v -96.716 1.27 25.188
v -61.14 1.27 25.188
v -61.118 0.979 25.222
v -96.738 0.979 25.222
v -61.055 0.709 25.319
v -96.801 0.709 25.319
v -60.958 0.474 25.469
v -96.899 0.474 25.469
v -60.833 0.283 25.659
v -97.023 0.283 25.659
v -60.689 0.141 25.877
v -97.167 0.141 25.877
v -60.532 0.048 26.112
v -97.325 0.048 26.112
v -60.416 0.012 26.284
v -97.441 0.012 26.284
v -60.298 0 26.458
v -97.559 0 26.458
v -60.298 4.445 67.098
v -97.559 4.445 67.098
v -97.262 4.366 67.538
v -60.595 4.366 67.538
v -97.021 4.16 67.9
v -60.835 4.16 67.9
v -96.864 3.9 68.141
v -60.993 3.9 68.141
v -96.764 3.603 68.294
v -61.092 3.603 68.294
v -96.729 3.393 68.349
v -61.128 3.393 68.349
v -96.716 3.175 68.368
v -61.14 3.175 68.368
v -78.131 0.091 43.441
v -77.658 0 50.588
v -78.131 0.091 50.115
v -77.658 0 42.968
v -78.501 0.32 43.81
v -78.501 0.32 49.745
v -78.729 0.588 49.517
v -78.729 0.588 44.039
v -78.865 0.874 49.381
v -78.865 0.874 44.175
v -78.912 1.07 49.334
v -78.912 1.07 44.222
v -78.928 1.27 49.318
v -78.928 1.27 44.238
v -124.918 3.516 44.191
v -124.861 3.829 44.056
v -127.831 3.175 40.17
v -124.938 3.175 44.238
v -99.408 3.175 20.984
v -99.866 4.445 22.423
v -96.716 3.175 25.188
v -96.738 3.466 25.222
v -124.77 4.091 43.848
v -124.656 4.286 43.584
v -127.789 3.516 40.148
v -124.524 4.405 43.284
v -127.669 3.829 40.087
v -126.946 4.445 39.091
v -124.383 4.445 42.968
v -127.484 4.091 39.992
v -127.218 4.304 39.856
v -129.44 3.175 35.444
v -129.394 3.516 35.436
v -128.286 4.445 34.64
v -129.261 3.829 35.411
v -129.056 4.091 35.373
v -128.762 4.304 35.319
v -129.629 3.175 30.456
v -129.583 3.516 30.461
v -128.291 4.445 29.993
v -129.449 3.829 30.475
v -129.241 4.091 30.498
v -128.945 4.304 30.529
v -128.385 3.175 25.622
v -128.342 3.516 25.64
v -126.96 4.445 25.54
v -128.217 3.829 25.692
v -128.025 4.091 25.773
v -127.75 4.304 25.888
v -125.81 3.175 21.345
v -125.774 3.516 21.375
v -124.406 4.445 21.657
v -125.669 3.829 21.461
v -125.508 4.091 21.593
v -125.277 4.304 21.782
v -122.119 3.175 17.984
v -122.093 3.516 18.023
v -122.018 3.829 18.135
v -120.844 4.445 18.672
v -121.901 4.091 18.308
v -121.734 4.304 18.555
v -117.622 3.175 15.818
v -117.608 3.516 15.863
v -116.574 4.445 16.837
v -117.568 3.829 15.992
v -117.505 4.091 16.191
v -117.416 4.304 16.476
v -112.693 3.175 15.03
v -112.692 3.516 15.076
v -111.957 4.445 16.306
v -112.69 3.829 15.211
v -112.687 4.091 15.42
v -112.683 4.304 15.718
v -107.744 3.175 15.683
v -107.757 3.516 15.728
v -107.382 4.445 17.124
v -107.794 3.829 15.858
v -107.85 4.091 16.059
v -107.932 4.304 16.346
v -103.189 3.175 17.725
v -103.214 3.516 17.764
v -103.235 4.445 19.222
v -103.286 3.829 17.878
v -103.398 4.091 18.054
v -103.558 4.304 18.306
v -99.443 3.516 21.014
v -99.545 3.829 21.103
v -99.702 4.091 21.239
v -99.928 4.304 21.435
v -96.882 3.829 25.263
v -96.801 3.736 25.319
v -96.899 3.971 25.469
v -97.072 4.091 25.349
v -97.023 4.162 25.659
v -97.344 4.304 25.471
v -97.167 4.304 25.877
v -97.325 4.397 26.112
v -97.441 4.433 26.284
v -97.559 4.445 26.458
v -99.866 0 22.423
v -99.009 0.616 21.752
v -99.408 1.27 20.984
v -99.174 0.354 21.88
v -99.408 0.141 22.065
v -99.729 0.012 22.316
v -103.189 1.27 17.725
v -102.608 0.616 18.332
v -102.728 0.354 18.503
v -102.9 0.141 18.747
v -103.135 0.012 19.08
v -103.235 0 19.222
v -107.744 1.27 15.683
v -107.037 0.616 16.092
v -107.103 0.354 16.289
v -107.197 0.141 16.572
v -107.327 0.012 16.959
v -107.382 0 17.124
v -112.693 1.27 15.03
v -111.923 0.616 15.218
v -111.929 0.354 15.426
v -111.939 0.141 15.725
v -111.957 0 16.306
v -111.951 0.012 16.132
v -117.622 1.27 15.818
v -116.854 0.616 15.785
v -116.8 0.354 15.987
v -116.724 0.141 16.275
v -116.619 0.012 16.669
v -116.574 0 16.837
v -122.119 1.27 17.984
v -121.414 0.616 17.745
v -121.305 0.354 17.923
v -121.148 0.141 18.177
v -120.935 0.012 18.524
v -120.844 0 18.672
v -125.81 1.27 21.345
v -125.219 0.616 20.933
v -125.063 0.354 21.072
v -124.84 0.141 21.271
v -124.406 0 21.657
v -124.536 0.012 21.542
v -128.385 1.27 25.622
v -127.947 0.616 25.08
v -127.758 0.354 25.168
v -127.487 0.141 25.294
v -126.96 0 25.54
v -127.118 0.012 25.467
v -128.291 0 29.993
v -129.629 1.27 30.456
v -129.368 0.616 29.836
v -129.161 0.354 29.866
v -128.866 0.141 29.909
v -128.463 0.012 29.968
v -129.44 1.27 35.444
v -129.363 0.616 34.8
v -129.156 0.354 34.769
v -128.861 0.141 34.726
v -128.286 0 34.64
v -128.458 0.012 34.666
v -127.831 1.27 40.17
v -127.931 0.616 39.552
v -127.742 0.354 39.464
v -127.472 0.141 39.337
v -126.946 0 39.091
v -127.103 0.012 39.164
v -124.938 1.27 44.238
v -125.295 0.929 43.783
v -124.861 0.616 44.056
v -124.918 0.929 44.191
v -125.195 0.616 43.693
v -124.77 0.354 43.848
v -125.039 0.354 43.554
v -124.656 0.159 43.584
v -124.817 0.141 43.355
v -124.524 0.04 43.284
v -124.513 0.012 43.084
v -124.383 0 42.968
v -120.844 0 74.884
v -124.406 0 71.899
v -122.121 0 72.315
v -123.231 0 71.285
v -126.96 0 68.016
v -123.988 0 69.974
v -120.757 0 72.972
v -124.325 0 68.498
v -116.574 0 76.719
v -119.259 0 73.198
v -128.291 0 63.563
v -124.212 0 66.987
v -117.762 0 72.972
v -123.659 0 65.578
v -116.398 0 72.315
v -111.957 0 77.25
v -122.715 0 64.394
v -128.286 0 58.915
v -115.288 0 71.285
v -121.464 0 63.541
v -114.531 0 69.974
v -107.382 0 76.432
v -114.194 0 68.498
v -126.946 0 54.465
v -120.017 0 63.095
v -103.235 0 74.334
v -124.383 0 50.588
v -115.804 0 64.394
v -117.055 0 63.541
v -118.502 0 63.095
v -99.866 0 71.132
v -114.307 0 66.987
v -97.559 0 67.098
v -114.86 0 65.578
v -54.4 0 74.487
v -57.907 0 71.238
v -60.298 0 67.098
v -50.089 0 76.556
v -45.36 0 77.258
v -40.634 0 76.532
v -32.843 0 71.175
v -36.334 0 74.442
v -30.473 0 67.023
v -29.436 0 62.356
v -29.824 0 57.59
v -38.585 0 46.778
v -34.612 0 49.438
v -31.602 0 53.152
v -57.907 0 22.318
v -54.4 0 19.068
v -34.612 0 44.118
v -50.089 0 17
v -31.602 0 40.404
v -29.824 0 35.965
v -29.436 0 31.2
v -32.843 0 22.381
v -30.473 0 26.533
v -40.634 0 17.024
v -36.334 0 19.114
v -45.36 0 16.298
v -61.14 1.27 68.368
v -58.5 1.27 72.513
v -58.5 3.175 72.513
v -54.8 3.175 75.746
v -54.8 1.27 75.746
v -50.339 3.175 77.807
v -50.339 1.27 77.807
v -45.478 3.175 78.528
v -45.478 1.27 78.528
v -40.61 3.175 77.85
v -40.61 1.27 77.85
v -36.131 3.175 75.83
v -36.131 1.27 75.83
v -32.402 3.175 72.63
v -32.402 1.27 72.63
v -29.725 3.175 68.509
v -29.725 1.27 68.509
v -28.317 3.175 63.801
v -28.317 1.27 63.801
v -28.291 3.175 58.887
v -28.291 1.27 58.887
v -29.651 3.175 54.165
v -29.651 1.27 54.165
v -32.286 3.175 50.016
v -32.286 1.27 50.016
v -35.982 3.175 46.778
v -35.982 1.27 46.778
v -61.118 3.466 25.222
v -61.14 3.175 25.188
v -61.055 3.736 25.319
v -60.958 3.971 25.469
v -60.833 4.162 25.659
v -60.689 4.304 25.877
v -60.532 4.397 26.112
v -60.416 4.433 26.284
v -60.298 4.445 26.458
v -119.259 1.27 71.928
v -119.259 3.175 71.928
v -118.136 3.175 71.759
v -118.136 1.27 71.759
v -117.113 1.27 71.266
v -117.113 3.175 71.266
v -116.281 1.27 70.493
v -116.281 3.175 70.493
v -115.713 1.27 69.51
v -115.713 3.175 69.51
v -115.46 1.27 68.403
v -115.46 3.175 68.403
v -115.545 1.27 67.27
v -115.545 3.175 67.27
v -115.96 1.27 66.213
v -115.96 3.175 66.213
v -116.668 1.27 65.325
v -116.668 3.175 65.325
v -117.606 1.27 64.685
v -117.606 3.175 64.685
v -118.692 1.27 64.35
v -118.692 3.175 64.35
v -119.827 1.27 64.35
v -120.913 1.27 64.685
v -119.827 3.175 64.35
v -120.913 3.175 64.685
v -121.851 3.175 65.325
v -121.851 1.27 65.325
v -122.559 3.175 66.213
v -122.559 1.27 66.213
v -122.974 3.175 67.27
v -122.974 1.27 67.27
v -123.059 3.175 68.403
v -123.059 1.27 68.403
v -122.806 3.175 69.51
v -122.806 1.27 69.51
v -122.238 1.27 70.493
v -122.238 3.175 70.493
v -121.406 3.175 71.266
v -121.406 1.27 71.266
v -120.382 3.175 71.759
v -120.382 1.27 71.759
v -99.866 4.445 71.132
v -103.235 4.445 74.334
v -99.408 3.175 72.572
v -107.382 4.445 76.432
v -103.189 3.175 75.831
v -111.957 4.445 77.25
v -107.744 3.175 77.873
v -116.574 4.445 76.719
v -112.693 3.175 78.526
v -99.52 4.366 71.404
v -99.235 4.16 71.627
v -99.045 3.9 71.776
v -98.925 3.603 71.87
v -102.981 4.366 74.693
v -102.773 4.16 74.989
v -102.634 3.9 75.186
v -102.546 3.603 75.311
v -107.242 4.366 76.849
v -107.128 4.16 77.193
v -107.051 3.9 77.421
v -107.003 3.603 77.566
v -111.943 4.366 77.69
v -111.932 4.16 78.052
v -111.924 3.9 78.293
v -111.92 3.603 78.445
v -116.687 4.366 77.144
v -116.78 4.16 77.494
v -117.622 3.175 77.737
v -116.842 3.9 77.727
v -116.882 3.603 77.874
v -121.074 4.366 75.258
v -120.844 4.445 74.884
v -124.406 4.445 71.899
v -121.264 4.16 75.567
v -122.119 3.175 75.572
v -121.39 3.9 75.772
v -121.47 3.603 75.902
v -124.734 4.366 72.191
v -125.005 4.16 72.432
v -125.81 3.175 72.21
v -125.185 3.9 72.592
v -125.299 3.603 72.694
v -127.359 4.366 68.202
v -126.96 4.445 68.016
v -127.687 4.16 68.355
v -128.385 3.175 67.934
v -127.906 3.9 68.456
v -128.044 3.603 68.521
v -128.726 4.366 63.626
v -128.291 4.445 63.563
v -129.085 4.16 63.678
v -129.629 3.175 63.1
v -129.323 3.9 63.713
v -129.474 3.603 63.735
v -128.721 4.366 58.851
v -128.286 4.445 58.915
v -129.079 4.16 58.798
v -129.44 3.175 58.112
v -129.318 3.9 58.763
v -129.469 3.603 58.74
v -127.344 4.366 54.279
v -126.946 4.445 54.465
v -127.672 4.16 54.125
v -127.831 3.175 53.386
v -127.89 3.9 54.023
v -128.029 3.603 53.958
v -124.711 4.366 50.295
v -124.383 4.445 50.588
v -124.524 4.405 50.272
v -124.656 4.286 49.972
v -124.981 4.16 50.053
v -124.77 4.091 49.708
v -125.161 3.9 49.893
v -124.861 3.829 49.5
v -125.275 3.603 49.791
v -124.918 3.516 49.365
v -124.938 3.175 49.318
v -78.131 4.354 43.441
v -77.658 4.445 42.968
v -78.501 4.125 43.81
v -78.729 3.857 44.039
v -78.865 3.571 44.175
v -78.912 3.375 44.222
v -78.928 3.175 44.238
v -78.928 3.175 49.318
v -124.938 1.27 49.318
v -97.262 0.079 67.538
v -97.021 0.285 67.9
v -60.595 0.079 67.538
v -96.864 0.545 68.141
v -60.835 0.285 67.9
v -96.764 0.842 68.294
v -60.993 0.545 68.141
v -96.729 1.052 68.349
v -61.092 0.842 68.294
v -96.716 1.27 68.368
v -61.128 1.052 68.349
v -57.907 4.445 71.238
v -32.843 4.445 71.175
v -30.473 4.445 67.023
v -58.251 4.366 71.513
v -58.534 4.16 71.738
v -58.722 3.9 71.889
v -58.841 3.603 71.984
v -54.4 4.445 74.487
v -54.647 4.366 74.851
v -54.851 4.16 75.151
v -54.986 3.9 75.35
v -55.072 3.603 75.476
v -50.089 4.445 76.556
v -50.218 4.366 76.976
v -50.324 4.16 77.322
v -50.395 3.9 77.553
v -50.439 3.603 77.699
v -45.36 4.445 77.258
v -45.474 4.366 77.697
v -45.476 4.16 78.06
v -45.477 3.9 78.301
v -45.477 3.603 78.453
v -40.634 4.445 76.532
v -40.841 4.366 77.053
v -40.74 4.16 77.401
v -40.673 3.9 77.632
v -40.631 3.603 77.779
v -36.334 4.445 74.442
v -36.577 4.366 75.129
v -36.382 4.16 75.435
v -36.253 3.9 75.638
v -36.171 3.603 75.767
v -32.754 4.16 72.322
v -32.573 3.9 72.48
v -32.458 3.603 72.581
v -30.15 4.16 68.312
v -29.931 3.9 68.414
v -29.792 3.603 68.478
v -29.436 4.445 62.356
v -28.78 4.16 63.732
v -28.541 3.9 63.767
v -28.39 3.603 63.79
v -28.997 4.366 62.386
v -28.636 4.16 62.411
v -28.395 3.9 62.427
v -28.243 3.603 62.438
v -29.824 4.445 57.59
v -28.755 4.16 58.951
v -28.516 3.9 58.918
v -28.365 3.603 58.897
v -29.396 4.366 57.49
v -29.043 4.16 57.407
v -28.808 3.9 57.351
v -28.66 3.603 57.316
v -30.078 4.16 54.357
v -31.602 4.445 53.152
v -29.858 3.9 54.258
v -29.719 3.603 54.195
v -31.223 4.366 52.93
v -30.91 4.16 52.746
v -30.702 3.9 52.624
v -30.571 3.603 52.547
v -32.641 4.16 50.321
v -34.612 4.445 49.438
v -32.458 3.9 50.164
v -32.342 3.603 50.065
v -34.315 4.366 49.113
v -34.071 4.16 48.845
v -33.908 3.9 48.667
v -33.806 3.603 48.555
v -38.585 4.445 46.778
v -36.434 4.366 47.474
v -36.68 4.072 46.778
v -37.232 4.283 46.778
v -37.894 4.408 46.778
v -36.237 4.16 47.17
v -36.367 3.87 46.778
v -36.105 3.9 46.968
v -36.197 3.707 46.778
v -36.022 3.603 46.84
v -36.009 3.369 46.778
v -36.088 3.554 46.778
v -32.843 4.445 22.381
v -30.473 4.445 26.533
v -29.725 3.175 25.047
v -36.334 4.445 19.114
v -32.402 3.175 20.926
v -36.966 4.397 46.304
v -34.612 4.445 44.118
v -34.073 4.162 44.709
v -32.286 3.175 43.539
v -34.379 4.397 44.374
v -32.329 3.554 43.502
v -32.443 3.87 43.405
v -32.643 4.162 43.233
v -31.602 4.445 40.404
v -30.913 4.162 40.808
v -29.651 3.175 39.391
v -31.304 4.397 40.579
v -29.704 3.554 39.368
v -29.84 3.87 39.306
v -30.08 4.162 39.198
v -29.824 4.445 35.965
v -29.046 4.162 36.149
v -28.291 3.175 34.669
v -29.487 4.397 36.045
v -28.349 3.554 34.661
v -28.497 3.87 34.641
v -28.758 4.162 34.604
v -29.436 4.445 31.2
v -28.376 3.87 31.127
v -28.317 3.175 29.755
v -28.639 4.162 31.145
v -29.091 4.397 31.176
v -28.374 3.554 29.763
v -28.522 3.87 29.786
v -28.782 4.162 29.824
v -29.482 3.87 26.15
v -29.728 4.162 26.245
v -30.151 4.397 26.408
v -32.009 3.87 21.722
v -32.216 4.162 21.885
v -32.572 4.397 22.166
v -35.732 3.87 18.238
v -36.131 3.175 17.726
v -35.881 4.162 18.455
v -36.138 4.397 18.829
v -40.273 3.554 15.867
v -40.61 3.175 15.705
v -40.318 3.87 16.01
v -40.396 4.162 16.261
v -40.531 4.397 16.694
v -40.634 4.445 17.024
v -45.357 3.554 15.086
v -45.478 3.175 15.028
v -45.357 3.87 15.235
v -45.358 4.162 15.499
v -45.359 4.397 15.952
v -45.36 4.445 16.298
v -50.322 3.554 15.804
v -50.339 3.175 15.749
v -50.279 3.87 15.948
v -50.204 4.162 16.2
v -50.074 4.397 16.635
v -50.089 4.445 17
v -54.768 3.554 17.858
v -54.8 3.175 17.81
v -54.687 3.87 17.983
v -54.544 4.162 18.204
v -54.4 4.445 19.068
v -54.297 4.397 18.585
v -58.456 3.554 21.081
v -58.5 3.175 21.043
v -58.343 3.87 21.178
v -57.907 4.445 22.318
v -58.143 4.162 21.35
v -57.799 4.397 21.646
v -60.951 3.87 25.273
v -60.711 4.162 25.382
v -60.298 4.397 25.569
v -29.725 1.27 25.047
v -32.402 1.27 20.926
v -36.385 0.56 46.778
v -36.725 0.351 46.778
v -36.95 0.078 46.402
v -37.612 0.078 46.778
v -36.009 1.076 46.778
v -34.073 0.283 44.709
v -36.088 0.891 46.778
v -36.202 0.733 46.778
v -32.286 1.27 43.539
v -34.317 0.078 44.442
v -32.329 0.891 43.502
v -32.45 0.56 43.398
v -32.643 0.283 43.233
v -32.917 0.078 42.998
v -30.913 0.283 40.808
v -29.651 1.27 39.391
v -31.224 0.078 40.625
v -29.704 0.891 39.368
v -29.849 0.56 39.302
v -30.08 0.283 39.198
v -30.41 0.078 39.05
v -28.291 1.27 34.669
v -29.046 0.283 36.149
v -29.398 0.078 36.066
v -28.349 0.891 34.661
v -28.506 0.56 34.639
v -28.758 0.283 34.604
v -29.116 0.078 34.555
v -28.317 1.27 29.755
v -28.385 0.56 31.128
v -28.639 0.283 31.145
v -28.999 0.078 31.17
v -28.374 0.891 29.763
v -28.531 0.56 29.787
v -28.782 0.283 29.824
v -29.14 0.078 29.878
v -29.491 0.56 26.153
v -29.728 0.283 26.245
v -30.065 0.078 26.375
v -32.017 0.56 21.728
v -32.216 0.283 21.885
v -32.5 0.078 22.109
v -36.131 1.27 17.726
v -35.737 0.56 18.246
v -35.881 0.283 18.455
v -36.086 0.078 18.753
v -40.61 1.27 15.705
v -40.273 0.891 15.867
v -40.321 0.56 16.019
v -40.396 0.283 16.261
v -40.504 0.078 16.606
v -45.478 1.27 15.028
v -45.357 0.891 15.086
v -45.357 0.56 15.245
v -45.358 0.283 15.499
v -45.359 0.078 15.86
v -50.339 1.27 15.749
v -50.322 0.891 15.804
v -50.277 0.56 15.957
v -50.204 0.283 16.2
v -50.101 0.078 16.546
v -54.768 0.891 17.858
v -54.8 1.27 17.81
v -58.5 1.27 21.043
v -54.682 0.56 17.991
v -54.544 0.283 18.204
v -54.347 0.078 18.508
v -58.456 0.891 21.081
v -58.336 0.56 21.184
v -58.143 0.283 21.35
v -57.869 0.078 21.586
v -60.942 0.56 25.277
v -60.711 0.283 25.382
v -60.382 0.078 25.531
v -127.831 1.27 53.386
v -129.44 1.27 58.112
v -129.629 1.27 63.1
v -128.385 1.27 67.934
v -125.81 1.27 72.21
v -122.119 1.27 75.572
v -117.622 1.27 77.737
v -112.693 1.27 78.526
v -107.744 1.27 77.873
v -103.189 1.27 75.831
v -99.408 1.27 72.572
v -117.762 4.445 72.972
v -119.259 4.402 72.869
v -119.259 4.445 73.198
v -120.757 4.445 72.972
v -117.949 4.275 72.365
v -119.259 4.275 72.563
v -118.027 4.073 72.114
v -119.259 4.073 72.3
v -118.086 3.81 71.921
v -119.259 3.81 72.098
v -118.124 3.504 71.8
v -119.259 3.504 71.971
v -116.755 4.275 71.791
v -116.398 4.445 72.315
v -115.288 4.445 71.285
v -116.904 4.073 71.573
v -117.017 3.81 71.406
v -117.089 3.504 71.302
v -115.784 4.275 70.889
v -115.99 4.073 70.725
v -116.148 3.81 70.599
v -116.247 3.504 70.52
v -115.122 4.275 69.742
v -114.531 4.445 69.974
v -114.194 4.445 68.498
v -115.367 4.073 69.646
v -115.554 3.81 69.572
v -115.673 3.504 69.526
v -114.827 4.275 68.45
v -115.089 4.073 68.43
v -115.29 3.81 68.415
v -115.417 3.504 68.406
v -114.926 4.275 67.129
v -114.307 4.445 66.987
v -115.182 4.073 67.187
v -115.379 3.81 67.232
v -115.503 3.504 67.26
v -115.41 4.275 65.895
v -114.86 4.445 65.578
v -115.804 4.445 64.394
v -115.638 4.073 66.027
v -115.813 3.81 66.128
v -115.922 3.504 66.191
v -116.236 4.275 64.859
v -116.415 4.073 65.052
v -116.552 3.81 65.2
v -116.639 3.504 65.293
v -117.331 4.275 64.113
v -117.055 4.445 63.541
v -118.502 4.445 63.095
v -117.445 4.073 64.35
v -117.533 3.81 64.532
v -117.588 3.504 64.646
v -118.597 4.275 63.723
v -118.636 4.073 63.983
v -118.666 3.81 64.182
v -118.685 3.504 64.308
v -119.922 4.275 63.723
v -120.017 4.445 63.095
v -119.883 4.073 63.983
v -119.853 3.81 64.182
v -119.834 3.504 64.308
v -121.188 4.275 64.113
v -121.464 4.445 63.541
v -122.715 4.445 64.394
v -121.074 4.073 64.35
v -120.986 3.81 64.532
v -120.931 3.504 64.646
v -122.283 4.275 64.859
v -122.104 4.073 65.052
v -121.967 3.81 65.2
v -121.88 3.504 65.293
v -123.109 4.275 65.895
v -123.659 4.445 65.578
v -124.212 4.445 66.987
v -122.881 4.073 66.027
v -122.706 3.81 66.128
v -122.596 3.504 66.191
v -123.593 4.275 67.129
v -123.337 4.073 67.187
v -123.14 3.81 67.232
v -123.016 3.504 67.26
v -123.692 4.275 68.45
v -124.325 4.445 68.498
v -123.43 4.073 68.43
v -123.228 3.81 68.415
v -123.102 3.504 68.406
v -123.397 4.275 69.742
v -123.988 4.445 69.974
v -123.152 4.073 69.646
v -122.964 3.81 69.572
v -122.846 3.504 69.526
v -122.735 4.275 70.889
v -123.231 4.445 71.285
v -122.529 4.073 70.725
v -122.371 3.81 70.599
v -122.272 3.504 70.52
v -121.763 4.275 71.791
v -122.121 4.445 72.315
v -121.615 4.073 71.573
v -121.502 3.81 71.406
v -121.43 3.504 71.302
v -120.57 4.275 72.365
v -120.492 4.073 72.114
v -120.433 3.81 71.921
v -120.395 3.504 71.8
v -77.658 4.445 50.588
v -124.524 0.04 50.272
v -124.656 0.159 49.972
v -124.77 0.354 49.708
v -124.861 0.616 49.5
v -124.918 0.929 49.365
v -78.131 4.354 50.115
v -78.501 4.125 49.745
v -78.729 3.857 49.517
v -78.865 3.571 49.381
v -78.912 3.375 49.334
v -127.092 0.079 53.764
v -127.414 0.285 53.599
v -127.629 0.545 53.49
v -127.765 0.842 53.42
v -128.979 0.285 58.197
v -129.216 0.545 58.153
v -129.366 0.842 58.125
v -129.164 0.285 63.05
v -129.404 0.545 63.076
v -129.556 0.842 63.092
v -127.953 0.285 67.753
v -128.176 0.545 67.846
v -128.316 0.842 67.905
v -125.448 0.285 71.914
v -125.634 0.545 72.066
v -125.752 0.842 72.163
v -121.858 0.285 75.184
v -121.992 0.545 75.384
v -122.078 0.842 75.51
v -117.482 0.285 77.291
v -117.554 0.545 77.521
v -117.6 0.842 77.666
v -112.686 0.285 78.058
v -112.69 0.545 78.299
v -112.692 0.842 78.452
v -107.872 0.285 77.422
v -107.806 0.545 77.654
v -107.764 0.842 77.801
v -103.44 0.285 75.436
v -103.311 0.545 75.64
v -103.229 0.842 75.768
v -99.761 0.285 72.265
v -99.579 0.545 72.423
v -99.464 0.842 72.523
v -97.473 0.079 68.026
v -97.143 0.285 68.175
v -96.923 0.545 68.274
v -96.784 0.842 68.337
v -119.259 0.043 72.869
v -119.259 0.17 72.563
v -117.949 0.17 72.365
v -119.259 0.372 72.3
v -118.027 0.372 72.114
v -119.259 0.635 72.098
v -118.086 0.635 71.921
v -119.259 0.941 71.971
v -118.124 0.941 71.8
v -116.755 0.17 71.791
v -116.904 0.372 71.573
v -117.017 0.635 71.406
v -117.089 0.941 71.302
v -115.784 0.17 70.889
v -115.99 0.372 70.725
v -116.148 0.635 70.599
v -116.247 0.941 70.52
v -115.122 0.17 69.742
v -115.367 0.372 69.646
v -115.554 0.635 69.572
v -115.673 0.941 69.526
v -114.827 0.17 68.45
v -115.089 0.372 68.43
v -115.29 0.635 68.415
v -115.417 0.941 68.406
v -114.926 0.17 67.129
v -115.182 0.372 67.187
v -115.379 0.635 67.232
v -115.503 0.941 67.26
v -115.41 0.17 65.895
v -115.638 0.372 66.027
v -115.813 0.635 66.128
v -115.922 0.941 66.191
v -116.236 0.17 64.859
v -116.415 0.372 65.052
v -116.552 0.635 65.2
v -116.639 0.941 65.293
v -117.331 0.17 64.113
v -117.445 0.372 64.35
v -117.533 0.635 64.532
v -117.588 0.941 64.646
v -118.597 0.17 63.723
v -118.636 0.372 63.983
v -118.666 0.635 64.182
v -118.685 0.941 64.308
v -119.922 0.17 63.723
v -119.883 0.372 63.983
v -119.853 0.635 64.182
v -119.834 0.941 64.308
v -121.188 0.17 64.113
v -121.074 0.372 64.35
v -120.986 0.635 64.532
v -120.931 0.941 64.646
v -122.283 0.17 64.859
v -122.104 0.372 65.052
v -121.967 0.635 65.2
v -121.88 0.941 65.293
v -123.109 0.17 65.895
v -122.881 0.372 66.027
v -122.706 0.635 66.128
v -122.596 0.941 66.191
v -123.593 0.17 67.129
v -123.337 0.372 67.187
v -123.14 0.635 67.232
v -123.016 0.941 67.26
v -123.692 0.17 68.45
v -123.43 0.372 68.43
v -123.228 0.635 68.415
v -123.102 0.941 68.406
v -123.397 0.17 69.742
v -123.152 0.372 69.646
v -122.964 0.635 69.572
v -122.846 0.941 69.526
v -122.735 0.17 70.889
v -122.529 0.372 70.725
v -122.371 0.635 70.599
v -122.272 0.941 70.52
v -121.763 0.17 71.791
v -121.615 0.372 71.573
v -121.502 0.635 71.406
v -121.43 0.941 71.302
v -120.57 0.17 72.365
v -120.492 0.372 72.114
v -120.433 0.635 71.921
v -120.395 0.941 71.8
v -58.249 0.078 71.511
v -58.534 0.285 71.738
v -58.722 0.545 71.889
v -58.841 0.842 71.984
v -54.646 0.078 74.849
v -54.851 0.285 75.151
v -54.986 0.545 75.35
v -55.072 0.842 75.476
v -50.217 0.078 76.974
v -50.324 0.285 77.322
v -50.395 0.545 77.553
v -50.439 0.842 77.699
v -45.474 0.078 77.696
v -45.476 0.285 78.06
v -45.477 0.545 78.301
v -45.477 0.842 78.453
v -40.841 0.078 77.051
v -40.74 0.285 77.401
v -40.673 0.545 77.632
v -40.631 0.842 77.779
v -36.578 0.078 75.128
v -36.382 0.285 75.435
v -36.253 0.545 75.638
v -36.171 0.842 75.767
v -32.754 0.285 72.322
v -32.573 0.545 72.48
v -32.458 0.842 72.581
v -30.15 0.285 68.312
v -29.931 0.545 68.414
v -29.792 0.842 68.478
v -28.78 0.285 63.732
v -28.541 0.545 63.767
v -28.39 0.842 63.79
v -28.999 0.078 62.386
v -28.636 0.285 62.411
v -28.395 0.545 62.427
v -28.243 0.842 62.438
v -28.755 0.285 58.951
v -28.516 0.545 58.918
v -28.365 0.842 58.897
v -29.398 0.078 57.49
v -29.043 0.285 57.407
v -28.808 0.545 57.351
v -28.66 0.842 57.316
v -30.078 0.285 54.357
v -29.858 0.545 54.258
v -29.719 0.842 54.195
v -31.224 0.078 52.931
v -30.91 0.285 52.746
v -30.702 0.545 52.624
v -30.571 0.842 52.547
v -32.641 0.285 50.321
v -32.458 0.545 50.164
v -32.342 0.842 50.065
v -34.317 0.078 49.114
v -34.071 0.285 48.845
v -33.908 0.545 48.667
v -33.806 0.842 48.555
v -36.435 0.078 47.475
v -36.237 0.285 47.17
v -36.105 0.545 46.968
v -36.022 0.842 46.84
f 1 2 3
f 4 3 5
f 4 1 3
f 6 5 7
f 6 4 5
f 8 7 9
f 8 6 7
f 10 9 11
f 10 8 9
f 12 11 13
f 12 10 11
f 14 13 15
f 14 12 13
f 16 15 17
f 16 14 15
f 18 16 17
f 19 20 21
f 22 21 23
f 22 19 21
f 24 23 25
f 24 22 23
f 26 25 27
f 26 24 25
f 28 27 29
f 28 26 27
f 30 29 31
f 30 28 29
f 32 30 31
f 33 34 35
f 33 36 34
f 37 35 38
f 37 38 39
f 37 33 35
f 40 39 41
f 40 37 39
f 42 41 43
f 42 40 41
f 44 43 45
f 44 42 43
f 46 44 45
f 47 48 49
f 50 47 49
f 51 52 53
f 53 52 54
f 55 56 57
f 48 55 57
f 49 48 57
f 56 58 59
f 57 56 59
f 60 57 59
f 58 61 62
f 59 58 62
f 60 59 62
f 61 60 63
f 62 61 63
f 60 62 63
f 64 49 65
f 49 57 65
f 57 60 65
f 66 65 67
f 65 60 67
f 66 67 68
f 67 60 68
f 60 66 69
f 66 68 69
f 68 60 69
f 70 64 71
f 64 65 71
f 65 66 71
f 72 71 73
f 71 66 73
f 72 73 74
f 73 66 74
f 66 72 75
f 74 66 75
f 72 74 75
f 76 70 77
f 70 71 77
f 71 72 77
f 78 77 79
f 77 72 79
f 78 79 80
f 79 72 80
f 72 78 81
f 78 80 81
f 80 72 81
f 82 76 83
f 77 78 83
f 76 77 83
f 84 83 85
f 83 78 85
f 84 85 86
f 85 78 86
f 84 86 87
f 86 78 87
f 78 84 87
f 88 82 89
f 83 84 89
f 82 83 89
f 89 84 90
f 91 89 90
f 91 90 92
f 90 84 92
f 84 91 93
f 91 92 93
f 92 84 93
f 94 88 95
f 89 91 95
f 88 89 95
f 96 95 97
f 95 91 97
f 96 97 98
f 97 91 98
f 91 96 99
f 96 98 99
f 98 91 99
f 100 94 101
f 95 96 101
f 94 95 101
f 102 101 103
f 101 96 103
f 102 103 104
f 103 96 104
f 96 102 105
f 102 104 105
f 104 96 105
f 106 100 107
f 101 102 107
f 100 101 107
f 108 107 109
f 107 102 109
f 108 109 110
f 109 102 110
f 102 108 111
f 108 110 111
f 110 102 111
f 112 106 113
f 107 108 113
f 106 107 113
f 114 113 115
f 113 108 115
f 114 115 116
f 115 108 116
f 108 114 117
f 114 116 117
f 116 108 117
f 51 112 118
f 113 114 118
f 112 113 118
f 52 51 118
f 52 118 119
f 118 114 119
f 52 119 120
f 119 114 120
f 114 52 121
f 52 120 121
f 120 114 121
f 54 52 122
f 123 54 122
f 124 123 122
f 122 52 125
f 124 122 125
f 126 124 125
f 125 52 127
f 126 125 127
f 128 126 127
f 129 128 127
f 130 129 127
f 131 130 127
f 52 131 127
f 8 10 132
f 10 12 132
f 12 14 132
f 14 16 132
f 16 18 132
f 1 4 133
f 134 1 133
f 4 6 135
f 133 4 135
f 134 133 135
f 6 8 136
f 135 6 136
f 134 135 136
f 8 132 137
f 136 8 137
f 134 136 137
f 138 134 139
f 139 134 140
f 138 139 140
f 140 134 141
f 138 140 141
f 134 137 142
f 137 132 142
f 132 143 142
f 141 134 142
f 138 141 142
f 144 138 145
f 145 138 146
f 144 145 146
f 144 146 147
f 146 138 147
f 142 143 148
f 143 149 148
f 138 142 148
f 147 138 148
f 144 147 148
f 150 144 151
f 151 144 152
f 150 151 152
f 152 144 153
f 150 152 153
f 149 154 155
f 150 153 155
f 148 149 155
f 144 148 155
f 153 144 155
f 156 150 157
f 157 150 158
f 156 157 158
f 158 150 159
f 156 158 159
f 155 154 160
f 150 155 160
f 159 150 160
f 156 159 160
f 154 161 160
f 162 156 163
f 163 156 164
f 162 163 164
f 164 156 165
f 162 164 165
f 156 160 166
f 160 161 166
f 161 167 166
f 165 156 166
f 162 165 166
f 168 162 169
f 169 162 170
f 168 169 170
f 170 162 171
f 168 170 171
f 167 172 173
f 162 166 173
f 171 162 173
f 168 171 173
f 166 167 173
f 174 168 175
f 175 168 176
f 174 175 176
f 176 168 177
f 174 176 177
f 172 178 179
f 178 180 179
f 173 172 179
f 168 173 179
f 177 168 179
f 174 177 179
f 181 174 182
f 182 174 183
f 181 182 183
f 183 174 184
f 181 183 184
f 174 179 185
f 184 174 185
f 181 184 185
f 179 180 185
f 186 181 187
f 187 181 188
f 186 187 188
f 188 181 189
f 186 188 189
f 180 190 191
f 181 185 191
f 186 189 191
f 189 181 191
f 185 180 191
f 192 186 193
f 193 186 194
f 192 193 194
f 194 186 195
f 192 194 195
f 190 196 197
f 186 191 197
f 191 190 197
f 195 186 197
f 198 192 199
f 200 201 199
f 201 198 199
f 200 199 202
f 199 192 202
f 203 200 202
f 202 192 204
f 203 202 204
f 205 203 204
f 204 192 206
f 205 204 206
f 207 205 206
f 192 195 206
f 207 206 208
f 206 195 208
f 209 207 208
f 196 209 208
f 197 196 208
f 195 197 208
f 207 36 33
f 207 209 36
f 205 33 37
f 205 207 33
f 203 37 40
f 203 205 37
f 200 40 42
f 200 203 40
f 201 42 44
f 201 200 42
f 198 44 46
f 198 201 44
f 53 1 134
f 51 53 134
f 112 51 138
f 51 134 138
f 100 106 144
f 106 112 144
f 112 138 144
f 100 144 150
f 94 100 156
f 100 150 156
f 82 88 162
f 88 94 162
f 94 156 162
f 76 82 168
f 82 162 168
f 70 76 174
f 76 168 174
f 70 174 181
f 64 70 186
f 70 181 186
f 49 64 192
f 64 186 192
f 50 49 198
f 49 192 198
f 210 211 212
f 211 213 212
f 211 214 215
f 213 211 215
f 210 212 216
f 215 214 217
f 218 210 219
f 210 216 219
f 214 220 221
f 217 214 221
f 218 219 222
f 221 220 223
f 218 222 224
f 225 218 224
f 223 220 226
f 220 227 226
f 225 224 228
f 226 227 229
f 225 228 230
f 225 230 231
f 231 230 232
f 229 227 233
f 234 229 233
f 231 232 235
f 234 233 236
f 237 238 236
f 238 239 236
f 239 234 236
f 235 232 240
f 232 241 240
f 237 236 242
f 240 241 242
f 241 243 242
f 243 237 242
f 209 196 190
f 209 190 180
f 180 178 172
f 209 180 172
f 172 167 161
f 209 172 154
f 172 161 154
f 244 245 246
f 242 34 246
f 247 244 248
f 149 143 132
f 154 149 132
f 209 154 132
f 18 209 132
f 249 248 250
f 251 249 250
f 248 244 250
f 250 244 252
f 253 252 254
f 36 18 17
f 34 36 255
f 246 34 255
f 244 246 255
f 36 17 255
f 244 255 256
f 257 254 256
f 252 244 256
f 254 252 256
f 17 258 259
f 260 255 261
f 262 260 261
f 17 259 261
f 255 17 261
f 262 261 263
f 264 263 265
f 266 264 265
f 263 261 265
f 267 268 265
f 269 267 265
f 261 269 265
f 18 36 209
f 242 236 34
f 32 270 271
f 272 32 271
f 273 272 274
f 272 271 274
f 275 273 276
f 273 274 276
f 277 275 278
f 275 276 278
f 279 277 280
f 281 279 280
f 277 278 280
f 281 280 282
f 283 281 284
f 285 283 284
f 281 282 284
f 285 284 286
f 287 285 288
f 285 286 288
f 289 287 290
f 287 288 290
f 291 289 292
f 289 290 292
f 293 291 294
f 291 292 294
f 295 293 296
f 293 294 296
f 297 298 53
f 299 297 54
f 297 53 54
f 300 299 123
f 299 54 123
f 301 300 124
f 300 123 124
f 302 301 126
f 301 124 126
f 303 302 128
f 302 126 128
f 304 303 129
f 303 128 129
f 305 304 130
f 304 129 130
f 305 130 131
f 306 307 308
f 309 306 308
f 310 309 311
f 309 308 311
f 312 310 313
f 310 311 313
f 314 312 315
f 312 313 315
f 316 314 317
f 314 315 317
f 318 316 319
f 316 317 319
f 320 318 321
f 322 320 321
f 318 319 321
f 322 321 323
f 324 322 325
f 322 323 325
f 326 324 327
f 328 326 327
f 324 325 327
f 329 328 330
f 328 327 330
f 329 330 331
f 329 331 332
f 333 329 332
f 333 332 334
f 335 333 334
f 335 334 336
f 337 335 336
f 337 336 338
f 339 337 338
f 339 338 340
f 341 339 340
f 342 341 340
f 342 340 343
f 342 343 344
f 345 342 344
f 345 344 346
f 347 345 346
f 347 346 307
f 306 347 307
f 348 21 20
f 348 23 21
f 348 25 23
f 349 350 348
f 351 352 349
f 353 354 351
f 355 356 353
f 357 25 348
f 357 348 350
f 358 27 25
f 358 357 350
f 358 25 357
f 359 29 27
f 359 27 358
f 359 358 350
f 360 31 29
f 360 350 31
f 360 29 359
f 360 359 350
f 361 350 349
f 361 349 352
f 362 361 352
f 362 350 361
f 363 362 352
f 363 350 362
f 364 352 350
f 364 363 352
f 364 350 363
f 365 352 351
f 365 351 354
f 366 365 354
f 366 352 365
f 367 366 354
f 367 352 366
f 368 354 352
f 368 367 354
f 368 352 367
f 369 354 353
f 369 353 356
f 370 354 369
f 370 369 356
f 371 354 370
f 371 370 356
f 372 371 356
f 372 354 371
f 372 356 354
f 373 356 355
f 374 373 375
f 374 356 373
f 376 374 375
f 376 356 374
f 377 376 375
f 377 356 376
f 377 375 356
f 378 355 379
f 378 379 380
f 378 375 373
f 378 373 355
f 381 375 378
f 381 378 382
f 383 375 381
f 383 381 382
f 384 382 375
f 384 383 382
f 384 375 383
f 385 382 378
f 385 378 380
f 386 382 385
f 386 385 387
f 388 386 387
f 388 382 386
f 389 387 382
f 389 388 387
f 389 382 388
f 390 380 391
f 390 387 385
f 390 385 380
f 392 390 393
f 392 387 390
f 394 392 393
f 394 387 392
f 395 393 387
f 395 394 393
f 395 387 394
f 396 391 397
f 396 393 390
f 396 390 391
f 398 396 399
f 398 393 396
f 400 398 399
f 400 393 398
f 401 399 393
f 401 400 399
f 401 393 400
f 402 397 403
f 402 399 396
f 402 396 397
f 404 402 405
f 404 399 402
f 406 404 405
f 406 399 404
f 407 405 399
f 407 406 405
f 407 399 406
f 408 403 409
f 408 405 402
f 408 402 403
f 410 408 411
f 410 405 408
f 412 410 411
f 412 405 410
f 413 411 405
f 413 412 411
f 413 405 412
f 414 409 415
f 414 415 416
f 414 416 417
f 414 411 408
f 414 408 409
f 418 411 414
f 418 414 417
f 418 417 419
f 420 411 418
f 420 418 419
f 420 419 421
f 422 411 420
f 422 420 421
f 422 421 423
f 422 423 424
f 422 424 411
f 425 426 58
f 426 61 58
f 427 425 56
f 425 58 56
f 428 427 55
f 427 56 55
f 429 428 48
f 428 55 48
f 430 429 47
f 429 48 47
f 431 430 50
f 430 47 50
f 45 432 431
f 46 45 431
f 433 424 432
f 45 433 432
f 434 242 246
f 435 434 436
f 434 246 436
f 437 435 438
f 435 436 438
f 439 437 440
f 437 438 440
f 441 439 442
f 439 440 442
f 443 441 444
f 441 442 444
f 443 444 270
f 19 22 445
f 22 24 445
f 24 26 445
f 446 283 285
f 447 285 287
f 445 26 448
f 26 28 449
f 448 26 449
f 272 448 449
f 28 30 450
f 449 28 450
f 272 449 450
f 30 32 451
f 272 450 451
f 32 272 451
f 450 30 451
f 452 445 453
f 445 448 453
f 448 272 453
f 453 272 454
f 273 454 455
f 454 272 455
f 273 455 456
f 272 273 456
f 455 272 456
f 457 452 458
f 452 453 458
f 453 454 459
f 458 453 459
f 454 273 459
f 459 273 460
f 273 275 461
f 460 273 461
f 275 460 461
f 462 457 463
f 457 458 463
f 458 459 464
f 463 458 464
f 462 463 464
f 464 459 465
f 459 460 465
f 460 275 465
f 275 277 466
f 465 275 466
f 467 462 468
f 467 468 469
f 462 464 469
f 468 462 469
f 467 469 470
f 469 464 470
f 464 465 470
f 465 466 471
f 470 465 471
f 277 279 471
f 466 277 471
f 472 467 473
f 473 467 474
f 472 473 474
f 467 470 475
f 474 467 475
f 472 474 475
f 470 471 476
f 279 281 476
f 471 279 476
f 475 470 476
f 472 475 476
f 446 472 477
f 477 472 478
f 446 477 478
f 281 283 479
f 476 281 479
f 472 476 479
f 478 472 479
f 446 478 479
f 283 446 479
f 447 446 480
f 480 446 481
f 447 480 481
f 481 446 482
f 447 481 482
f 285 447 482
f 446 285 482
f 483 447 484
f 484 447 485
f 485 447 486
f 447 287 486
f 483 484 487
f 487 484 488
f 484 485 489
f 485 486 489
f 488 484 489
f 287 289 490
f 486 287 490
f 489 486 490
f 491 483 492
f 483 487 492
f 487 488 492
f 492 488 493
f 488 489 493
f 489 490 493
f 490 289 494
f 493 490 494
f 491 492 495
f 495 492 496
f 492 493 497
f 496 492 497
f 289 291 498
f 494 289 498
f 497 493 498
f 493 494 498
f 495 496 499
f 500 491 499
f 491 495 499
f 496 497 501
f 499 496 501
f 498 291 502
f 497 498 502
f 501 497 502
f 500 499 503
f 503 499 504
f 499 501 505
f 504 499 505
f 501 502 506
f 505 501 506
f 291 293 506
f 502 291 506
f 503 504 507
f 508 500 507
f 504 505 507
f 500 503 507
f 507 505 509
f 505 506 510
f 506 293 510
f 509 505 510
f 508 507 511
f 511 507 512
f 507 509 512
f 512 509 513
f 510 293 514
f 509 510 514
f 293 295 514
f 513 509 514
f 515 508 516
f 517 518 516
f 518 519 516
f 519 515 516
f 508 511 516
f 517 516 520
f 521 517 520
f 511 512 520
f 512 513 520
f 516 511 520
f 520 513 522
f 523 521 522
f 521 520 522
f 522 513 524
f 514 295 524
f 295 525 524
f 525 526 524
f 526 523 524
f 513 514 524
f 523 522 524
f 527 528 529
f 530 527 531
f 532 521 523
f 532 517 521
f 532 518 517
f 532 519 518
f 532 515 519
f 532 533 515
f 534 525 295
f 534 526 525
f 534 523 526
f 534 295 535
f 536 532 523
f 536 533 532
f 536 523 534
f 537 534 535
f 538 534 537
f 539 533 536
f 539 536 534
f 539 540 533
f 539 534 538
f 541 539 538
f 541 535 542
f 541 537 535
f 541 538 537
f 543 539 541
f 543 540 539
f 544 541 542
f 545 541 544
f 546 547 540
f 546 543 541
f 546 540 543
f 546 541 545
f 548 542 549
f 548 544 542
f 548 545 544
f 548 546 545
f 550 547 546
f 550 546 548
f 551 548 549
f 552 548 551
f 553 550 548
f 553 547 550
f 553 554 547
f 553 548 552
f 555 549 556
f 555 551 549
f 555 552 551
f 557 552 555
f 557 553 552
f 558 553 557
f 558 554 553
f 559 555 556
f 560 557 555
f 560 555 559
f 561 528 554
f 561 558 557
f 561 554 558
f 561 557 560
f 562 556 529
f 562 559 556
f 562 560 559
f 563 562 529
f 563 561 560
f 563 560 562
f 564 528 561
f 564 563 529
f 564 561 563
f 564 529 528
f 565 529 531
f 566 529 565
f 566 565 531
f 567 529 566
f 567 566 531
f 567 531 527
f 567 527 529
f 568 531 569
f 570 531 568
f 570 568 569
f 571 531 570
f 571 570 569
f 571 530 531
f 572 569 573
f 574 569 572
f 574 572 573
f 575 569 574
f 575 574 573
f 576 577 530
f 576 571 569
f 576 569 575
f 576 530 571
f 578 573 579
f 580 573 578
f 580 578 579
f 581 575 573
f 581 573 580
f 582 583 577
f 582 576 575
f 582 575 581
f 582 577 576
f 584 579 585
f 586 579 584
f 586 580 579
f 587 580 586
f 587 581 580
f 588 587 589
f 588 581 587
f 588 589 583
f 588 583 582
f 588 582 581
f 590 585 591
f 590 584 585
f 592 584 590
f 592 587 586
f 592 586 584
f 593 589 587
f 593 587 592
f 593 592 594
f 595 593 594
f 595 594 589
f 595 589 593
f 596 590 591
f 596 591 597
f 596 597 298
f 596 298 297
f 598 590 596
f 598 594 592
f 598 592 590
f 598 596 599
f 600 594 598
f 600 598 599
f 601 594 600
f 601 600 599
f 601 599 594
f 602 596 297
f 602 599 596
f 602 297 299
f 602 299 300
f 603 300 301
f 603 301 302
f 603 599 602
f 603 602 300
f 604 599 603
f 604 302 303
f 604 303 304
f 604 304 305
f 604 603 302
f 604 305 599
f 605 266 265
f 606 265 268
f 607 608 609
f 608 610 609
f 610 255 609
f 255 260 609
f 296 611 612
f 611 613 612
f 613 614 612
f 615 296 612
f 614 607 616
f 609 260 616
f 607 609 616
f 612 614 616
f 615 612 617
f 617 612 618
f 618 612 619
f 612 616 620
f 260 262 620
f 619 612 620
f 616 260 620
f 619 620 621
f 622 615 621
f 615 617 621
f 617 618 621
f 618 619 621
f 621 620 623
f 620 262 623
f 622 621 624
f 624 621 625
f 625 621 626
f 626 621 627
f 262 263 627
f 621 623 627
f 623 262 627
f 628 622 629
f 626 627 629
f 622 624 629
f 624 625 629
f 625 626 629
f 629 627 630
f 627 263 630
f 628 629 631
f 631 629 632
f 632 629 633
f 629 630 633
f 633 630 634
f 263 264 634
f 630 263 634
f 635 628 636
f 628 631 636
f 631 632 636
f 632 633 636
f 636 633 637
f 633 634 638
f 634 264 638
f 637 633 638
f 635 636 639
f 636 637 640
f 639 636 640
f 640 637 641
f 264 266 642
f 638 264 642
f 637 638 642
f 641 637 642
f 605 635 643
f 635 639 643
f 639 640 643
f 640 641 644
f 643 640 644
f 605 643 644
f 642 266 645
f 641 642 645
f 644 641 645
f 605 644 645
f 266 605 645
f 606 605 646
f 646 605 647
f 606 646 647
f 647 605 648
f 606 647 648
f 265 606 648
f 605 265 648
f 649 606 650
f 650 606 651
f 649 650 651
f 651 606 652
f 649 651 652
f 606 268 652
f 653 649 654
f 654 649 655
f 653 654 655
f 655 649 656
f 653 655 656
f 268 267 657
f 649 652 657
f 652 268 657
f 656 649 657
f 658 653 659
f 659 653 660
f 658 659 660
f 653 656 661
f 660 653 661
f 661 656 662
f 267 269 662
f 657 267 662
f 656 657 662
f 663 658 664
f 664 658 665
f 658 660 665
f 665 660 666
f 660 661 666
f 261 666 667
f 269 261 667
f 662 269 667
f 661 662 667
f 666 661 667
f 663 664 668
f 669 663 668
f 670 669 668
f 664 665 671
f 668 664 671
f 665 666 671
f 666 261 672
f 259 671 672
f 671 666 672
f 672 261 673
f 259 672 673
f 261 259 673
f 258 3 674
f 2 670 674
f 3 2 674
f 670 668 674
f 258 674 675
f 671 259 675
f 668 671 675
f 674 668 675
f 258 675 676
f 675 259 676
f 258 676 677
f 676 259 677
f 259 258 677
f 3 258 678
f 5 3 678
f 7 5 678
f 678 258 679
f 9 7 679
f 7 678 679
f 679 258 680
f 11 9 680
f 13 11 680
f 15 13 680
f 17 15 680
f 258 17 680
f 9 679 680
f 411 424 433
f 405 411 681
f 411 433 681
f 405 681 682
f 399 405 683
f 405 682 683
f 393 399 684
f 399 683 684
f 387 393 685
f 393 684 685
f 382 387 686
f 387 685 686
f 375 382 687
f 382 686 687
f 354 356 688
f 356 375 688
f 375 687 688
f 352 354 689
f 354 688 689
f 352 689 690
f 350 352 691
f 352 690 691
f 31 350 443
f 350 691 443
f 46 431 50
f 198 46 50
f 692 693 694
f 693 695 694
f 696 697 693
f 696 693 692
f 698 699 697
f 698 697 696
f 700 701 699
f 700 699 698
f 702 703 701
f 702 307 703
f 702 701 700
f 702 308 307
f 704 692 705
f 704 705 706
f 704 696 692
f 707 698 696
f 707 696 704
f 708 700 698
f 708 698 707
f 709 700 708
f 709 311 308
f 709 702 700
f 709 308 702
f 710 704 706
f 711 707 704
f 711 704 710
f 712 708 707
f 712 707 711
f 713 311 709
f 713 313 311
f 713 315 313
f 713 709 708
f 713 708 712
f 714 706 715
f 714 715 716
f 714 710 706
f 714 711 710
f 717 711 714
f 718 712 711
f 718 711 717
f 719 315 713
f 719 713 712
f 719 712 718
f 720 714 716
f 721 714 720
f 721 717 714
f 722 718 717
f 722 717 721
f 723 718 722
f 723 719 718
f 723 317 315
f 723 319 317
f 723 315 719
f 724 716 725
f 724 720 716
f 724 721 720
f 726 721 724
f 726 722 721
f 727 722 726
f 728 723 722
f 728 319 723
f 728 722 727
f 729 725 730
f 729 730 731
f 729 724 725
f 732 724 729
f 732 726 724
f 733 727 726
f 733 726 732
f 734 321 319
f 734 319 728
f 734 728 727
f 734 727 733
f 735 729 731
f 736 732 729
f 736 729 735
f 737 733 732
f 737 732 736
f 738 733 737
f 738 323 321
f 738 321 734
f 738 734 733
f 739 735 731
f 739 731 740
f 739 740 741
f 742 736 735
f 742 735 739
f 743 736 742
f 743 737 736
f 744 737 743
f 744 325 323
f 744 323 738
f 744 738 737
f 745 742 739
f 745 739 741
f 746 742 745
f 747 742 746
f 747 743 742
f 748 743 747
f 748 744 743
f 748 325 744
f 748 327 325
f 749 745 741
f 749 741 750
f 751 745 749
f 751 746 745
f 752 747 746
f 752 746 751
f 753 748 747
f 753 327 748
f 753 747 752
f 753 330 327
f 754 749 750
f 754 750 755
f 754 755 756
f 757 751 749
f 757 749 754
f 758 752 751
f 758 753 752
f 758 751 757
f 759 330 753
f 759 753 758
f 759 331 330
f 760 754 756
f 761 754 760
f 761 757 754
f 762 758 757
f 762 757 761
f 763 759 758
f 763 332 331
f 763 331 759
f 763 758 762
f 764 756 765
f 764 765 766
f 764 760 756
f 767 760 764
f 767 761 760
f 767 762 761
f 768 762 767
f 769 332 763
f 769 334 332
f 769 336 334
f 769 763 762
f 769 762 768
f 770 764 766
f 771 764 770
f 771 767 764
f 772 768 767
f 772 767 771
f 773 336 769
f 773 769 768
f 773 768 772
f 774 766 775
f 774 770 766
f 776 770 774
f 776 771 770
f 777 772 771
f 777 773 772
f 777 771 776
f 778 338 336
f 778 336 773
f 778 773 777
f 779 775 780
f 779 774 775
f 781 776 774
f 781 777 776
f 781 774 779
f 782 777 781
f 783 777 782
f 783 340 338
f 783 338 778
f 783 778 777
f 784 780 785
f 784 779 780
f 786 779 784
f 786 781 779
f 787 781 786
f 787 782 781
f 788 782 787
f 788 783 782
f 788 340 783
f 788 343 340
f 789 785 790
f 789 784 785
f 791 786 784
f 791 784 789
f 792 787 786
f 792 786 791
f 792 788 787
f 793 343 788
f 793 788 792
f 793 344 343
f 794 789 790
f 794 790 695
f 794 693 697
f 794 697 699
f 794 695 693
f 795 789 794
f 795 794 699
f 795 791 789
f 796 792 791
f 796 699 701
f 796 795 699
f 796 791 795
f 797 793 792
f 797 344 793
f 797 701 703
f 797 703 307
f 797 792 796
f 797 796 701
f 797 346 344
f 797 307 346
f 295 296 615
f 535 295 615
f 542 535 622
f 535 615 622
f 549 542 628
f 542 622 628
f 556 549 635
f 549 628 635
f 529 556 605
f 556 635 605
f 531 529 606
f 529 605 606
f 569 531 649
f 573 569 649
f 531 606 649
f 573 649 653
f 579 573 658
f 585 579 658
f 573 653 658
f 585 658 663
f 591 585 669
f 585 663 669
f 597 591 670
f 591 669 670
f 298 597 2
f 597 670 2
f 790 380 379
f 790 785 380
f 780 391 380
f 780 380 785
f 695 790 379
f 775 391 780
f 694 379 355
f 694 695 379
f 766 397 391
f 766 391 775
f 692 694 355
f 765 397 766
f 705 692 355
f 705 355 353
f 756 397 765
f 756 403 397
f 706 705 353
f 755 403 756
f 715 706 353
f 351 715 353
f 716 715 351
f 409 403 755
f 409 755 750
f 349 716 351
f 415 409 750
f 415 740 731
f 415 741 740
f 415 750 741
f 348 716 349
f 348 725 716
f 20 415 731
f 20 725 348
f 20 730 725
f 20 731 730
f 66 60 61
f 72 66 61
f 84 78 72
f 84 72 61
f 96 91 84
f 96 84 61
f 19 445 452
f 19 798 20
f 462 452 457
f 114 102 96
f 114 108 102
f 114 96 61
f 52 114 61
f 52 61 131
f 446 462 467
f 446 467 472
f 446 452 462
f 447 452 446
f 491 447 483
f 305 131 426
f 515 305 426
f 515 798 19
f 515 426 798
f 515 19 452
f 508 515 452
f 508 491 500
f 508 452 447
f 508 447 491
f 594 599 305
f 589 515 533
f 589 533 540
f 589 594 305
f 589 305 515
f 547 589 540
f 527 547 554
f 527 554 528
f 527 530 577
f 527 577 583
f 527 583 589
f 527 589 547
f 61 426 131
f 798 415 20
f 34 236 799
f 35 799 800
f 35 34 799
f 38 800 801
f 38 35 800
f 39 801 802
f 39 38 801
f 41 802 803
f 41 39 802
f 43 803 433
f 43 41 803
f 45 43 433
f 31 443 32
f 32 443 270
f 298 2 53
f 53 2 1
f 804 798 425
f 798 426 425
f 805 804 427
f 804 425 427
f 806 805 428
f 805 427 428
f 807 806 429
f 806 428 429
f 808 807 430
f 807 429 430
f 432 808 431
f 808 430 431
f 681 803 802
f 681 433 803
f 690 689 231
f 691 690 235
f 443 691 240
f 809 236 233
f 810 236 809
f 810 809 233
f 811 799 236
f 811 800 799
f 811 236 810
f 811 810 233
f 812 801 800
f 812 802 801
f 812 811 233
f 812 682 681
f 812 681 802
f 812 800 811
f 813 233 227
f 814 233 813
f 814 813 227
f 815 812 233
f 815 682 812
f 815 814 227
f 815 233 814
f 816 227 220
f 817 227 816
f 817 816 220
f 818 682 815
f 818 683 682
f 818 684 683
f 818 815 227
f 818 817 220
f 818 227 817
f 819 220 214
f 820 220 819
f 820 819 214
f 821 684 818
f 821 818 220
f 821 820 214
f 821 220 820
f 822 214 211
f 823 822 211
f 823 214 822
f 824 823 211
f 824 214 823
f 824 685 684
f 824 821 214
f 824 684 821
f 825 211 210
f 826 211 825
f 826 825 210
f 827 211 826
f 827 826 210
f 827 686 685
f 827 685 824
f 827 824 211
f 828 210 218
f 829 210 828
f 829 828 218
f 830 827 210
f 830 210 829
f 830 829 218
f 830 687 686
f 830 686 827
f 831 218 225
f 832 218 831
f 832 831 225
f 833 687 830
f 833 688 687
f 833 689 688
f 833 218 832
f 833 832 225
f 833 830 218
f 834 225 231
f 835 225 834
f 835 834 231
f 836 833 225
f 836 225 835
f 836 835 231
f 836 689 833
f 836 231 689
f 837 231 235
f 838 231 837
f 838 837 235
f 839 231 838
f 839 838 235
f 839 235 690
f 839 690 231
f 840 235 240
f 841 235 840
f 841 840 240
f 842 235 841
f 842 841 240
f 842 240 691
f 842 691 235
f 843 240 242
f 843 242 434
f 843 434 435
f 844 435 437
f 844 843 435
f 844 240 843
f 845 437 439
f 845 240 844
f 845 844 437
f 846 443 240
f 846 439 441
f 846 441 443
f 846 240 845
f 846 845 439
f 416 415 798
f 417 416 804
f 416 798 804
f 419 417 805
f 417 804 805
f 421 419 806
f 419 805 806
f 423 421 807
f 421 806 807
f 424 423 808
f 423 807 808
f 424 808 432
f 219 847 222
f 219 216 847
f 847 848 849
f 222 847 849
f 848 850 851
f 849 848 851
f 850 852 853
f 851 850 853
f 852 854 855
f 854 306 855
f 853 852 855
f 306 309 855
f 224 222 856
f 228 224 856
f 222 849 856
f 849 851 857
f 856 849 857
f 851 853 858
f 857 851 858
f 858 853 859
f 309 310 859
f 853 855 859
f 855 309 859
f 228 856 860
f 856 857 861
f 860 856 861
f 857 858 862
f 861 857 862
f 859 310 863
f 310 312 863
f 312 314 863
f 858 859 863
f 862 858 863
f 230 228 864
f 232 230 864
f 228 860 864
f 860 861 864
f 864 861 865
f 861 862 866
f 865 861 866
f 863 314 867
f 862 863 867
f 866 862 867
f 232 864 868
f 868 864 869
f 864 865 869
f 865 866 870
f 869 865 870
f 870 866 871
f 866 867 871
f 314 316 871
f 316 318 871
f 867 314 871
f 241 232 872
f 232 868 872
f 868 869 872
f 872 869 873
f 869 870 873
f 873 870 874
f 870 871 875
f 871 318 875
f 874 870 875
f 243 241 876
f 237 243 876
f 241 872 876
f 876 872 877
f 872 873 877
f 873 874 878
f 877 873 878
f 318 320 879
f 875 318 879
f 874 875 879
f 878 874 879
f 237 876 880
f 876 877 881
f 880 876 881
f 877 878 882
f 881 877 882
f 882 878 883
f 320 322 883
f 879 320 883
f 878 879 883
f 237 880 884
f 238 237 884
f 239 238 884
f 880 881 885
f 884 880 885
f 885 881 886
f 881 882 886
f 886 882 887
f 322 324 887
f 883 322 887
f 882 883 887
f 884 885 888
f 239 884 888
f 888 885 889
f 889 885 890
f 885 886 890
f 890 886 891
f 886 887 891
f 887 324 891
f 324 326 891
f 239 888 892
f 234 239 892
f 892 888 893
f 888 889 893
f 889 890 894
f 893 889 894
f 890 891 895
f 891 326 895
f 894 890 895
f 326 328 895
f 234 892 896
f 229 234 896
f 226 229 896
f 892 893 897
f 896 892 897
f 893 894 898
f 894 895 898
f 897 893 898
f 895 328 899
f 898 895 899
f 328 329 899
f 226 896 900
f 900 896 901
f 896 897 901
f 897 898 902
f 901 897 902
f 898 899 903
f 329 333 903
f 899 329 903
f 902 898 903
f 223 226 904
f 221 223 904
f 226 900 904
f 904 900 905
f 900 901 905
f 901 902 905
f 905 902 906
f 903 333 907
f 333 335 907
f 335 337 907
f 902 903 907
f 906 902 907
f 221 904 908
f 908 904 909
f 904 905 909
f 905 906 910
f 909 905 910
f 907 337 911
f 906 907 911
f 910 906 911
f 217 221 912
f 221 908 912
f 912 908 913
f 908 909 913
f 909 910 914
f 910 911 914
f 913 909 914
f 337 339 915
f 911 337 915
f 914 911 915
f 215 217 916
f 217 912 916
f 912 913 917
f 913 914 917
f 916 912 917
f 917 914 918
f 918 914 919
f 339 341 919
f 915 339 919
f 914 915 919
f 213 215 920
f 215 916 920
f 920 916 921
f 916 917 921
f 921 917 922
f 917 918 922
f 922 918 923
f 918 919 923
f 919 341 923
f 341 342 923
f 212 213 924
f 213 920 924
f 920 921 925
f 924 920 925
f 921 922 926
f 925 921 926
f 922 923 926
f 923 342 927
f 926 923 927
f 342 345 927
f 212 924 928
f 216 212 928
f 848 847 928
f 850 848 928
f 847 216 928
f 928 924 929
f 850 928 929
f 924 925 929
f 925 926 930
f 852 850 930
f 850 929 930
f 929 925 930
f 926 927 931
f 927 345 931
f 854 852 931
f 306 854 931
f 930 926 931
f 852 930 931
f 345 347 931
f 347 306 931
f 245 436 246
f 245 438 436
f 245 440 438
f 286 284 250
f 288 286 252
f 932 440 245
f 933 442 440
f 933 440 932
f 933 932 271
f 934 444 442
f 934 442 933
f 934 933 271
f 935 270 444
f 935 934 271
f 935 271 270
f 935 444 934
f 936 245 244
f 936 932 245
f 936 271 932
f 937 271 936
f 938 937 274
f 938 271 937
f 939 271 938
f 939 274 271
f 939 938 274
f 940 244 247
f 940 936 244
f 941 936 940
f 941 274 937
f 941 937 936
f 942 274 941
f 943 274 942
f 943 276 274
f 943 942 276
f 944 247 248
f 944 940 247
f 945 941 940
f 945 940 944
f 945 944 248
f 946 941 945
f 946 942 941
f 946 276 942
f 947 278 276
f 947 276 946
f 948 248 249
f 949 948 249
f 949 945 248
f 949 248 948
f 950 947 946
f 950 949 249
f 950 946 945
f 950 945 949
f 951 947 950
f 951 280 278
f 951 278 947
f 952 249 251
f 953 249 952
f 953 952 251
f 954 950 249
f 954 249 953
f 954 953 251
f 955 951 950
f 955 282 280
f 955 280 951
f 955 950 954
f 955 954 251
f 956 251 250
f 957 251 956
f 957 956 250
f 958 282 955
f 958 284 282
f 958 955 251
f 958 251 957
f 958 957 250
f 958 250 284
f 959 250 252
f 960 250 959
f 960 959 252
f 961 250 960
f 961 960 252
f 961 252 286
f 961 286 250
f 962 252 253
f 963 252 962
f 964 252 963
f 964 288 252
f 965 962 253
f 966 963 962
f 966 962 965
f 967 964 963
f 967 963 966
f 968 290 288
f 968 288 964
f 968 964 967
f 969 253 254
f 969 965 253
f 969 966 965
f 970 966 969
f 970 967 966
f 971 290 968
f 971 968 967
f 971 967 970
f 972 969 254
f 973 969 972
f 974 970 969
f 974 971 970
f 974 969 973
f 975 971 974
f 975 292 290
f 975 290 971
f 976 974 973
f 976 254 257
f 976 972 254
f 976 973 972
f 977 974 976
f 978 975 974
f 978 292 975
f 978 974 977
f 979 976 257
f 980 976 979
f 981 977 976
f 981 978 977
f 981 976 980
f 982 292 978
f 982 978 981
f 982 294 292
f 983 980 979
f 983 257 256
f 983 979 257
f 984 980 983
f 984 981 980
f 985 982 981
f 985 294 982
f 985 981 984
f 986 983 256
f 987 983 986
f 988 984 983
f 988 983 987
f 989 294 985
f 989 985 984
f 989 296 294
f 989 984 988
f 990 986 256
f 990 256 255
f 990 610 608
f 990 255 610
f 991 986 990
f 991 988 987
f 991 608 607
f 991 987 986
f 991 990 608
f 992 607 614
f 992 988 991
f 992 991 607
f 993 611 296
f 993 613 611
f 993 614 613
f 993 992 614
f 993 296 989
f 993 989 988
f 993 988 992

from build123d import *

# Parameters (mm, degrees)
BOSS_EXTRUDE1_DEPTH     = 4.445
SKETCH2_R               = 3.81
CUT_EXTRUDE1_DEPTH      = 152.70955658
CUT_EXTRUDE1_DEPTH_BACK = 152.70955658
FILLET2_R               = 1.27


with BuildPart() as part:
    # Sketch1 → Boss-Extrude1 (new body)
    with BuildSketch(Plane(origin=(0, 0, 0), x_dir=(1, 0, 0), z_dir=(0, 1, 0))):
        with BuildLine():
            Line((-61.139986431, -25.187895035), (-96.716377793, -25.187895035))
            ThreePointArc((-96.716377793, -25.187895035), (-123.704360598, -19.192627404), (-121.874754191, -46.777895035))
            ThreePointArc((-121.874754191, -46.777895035), (-123.704360598, -74.363162665), (-96.716377793, -68.367895035))
            Line((-96.716377793, -68.367895035), (-61.139986431, -68.367895035))
            ThreePointArc((-61.139986431, -68.367895035), (-34.152003626, -74.363162665), (-35.981610034, -46.777895035))
            ThreePointArc((-35.981610034, -46.777895035), (-34.152003626, -19.192627404), (-61.139986431, -25.187895035))
        make_face()
    extrude(amount=BOSS_EXTRUDE1_DEPTH)

    # Sketch2 → Cut-Extrude1 (cut, two sides)
    with BuildSketch(Plane(origin=(0, 4.445, 0), x_dir=(1, 0, 0), z_dir=(0, 1, 0))) as cut_extrude1_sk:
        with BuildLine():
            Line((-78.928182112, -44.237895035), (-124.938415086, -44.237895035))
            ThreePointArc((-124.938415086, -44.237895035), (-123.479984337, -45.596427234), (-121.874754191, -46.777895035))
            ThreePointArc((-121.874754191, -46.777895035), (-123.479984337, -47.959362836), (-124.938415086, -49.317895035))
            Line((-124.938415086, -49.317895035), (-78.928182112, -49.317895035))
            Line((-78.928182112, -49.317895035), (-78.928182112, -44.237895035))
        make_face()
        with Locations(Location((-119.259455088, -68.117887971, 0), (0, 0, 270))):
            Circle(SKETCH2_R)
    extrude(amount=CUT_EXTRUDE1_DEPTH, mode=Mode.SUBTRACT)
    extrude(cut_extrude1_sk.sketch, amount=-CUT_EXTRUDE1_DEPTH_BACK, mode=Mode.SUBTRACT)

    # Fillet2
    fillet2_edges = [part.edges().sort_by_distance(p)[0] for p in [
        (-34.152003626, 0, 19.192627404),
        (-34.152003626, 4.445, 19.192627404),
        (-34.152003626, 0, 74.363162665),
        (-34.152003626, 4.445, 74.363162665),
        (-78.928182112, 0, 25.187895035),
        (-78.928182112, 4.445, 25.187895035),
        (-78.928182112, 0, 68.367895035),
        (-122.119440764, 0, 75.571739971),
        (-101.933298599, 0, 49.317895035),
        (-78.928182112, 0, 46.777895035),
        (-101.933298599, 0, 44.237895035),
        (-122.119440764, 0, 17.984050099),
        (-119.259455088, 0, 64.307887971),
        (-78.928182112, 4.445, 68.367895035),
        (-122.119440764, 4.445, 75.571739971),
        (-101.933298599, 4.445, 49.317895035),
        (-78.928182112, 4.445, 46.777895035),
        (-101.933298599, 4.445, 44.237895035),
        (-122.119440764, 4.445, 17.984050099),
        (-119.259455088, 4.445, 64.307887971),
    ]]
    fillet(fillet2_edges, radius=FILLET2_R)


solid = part.part
